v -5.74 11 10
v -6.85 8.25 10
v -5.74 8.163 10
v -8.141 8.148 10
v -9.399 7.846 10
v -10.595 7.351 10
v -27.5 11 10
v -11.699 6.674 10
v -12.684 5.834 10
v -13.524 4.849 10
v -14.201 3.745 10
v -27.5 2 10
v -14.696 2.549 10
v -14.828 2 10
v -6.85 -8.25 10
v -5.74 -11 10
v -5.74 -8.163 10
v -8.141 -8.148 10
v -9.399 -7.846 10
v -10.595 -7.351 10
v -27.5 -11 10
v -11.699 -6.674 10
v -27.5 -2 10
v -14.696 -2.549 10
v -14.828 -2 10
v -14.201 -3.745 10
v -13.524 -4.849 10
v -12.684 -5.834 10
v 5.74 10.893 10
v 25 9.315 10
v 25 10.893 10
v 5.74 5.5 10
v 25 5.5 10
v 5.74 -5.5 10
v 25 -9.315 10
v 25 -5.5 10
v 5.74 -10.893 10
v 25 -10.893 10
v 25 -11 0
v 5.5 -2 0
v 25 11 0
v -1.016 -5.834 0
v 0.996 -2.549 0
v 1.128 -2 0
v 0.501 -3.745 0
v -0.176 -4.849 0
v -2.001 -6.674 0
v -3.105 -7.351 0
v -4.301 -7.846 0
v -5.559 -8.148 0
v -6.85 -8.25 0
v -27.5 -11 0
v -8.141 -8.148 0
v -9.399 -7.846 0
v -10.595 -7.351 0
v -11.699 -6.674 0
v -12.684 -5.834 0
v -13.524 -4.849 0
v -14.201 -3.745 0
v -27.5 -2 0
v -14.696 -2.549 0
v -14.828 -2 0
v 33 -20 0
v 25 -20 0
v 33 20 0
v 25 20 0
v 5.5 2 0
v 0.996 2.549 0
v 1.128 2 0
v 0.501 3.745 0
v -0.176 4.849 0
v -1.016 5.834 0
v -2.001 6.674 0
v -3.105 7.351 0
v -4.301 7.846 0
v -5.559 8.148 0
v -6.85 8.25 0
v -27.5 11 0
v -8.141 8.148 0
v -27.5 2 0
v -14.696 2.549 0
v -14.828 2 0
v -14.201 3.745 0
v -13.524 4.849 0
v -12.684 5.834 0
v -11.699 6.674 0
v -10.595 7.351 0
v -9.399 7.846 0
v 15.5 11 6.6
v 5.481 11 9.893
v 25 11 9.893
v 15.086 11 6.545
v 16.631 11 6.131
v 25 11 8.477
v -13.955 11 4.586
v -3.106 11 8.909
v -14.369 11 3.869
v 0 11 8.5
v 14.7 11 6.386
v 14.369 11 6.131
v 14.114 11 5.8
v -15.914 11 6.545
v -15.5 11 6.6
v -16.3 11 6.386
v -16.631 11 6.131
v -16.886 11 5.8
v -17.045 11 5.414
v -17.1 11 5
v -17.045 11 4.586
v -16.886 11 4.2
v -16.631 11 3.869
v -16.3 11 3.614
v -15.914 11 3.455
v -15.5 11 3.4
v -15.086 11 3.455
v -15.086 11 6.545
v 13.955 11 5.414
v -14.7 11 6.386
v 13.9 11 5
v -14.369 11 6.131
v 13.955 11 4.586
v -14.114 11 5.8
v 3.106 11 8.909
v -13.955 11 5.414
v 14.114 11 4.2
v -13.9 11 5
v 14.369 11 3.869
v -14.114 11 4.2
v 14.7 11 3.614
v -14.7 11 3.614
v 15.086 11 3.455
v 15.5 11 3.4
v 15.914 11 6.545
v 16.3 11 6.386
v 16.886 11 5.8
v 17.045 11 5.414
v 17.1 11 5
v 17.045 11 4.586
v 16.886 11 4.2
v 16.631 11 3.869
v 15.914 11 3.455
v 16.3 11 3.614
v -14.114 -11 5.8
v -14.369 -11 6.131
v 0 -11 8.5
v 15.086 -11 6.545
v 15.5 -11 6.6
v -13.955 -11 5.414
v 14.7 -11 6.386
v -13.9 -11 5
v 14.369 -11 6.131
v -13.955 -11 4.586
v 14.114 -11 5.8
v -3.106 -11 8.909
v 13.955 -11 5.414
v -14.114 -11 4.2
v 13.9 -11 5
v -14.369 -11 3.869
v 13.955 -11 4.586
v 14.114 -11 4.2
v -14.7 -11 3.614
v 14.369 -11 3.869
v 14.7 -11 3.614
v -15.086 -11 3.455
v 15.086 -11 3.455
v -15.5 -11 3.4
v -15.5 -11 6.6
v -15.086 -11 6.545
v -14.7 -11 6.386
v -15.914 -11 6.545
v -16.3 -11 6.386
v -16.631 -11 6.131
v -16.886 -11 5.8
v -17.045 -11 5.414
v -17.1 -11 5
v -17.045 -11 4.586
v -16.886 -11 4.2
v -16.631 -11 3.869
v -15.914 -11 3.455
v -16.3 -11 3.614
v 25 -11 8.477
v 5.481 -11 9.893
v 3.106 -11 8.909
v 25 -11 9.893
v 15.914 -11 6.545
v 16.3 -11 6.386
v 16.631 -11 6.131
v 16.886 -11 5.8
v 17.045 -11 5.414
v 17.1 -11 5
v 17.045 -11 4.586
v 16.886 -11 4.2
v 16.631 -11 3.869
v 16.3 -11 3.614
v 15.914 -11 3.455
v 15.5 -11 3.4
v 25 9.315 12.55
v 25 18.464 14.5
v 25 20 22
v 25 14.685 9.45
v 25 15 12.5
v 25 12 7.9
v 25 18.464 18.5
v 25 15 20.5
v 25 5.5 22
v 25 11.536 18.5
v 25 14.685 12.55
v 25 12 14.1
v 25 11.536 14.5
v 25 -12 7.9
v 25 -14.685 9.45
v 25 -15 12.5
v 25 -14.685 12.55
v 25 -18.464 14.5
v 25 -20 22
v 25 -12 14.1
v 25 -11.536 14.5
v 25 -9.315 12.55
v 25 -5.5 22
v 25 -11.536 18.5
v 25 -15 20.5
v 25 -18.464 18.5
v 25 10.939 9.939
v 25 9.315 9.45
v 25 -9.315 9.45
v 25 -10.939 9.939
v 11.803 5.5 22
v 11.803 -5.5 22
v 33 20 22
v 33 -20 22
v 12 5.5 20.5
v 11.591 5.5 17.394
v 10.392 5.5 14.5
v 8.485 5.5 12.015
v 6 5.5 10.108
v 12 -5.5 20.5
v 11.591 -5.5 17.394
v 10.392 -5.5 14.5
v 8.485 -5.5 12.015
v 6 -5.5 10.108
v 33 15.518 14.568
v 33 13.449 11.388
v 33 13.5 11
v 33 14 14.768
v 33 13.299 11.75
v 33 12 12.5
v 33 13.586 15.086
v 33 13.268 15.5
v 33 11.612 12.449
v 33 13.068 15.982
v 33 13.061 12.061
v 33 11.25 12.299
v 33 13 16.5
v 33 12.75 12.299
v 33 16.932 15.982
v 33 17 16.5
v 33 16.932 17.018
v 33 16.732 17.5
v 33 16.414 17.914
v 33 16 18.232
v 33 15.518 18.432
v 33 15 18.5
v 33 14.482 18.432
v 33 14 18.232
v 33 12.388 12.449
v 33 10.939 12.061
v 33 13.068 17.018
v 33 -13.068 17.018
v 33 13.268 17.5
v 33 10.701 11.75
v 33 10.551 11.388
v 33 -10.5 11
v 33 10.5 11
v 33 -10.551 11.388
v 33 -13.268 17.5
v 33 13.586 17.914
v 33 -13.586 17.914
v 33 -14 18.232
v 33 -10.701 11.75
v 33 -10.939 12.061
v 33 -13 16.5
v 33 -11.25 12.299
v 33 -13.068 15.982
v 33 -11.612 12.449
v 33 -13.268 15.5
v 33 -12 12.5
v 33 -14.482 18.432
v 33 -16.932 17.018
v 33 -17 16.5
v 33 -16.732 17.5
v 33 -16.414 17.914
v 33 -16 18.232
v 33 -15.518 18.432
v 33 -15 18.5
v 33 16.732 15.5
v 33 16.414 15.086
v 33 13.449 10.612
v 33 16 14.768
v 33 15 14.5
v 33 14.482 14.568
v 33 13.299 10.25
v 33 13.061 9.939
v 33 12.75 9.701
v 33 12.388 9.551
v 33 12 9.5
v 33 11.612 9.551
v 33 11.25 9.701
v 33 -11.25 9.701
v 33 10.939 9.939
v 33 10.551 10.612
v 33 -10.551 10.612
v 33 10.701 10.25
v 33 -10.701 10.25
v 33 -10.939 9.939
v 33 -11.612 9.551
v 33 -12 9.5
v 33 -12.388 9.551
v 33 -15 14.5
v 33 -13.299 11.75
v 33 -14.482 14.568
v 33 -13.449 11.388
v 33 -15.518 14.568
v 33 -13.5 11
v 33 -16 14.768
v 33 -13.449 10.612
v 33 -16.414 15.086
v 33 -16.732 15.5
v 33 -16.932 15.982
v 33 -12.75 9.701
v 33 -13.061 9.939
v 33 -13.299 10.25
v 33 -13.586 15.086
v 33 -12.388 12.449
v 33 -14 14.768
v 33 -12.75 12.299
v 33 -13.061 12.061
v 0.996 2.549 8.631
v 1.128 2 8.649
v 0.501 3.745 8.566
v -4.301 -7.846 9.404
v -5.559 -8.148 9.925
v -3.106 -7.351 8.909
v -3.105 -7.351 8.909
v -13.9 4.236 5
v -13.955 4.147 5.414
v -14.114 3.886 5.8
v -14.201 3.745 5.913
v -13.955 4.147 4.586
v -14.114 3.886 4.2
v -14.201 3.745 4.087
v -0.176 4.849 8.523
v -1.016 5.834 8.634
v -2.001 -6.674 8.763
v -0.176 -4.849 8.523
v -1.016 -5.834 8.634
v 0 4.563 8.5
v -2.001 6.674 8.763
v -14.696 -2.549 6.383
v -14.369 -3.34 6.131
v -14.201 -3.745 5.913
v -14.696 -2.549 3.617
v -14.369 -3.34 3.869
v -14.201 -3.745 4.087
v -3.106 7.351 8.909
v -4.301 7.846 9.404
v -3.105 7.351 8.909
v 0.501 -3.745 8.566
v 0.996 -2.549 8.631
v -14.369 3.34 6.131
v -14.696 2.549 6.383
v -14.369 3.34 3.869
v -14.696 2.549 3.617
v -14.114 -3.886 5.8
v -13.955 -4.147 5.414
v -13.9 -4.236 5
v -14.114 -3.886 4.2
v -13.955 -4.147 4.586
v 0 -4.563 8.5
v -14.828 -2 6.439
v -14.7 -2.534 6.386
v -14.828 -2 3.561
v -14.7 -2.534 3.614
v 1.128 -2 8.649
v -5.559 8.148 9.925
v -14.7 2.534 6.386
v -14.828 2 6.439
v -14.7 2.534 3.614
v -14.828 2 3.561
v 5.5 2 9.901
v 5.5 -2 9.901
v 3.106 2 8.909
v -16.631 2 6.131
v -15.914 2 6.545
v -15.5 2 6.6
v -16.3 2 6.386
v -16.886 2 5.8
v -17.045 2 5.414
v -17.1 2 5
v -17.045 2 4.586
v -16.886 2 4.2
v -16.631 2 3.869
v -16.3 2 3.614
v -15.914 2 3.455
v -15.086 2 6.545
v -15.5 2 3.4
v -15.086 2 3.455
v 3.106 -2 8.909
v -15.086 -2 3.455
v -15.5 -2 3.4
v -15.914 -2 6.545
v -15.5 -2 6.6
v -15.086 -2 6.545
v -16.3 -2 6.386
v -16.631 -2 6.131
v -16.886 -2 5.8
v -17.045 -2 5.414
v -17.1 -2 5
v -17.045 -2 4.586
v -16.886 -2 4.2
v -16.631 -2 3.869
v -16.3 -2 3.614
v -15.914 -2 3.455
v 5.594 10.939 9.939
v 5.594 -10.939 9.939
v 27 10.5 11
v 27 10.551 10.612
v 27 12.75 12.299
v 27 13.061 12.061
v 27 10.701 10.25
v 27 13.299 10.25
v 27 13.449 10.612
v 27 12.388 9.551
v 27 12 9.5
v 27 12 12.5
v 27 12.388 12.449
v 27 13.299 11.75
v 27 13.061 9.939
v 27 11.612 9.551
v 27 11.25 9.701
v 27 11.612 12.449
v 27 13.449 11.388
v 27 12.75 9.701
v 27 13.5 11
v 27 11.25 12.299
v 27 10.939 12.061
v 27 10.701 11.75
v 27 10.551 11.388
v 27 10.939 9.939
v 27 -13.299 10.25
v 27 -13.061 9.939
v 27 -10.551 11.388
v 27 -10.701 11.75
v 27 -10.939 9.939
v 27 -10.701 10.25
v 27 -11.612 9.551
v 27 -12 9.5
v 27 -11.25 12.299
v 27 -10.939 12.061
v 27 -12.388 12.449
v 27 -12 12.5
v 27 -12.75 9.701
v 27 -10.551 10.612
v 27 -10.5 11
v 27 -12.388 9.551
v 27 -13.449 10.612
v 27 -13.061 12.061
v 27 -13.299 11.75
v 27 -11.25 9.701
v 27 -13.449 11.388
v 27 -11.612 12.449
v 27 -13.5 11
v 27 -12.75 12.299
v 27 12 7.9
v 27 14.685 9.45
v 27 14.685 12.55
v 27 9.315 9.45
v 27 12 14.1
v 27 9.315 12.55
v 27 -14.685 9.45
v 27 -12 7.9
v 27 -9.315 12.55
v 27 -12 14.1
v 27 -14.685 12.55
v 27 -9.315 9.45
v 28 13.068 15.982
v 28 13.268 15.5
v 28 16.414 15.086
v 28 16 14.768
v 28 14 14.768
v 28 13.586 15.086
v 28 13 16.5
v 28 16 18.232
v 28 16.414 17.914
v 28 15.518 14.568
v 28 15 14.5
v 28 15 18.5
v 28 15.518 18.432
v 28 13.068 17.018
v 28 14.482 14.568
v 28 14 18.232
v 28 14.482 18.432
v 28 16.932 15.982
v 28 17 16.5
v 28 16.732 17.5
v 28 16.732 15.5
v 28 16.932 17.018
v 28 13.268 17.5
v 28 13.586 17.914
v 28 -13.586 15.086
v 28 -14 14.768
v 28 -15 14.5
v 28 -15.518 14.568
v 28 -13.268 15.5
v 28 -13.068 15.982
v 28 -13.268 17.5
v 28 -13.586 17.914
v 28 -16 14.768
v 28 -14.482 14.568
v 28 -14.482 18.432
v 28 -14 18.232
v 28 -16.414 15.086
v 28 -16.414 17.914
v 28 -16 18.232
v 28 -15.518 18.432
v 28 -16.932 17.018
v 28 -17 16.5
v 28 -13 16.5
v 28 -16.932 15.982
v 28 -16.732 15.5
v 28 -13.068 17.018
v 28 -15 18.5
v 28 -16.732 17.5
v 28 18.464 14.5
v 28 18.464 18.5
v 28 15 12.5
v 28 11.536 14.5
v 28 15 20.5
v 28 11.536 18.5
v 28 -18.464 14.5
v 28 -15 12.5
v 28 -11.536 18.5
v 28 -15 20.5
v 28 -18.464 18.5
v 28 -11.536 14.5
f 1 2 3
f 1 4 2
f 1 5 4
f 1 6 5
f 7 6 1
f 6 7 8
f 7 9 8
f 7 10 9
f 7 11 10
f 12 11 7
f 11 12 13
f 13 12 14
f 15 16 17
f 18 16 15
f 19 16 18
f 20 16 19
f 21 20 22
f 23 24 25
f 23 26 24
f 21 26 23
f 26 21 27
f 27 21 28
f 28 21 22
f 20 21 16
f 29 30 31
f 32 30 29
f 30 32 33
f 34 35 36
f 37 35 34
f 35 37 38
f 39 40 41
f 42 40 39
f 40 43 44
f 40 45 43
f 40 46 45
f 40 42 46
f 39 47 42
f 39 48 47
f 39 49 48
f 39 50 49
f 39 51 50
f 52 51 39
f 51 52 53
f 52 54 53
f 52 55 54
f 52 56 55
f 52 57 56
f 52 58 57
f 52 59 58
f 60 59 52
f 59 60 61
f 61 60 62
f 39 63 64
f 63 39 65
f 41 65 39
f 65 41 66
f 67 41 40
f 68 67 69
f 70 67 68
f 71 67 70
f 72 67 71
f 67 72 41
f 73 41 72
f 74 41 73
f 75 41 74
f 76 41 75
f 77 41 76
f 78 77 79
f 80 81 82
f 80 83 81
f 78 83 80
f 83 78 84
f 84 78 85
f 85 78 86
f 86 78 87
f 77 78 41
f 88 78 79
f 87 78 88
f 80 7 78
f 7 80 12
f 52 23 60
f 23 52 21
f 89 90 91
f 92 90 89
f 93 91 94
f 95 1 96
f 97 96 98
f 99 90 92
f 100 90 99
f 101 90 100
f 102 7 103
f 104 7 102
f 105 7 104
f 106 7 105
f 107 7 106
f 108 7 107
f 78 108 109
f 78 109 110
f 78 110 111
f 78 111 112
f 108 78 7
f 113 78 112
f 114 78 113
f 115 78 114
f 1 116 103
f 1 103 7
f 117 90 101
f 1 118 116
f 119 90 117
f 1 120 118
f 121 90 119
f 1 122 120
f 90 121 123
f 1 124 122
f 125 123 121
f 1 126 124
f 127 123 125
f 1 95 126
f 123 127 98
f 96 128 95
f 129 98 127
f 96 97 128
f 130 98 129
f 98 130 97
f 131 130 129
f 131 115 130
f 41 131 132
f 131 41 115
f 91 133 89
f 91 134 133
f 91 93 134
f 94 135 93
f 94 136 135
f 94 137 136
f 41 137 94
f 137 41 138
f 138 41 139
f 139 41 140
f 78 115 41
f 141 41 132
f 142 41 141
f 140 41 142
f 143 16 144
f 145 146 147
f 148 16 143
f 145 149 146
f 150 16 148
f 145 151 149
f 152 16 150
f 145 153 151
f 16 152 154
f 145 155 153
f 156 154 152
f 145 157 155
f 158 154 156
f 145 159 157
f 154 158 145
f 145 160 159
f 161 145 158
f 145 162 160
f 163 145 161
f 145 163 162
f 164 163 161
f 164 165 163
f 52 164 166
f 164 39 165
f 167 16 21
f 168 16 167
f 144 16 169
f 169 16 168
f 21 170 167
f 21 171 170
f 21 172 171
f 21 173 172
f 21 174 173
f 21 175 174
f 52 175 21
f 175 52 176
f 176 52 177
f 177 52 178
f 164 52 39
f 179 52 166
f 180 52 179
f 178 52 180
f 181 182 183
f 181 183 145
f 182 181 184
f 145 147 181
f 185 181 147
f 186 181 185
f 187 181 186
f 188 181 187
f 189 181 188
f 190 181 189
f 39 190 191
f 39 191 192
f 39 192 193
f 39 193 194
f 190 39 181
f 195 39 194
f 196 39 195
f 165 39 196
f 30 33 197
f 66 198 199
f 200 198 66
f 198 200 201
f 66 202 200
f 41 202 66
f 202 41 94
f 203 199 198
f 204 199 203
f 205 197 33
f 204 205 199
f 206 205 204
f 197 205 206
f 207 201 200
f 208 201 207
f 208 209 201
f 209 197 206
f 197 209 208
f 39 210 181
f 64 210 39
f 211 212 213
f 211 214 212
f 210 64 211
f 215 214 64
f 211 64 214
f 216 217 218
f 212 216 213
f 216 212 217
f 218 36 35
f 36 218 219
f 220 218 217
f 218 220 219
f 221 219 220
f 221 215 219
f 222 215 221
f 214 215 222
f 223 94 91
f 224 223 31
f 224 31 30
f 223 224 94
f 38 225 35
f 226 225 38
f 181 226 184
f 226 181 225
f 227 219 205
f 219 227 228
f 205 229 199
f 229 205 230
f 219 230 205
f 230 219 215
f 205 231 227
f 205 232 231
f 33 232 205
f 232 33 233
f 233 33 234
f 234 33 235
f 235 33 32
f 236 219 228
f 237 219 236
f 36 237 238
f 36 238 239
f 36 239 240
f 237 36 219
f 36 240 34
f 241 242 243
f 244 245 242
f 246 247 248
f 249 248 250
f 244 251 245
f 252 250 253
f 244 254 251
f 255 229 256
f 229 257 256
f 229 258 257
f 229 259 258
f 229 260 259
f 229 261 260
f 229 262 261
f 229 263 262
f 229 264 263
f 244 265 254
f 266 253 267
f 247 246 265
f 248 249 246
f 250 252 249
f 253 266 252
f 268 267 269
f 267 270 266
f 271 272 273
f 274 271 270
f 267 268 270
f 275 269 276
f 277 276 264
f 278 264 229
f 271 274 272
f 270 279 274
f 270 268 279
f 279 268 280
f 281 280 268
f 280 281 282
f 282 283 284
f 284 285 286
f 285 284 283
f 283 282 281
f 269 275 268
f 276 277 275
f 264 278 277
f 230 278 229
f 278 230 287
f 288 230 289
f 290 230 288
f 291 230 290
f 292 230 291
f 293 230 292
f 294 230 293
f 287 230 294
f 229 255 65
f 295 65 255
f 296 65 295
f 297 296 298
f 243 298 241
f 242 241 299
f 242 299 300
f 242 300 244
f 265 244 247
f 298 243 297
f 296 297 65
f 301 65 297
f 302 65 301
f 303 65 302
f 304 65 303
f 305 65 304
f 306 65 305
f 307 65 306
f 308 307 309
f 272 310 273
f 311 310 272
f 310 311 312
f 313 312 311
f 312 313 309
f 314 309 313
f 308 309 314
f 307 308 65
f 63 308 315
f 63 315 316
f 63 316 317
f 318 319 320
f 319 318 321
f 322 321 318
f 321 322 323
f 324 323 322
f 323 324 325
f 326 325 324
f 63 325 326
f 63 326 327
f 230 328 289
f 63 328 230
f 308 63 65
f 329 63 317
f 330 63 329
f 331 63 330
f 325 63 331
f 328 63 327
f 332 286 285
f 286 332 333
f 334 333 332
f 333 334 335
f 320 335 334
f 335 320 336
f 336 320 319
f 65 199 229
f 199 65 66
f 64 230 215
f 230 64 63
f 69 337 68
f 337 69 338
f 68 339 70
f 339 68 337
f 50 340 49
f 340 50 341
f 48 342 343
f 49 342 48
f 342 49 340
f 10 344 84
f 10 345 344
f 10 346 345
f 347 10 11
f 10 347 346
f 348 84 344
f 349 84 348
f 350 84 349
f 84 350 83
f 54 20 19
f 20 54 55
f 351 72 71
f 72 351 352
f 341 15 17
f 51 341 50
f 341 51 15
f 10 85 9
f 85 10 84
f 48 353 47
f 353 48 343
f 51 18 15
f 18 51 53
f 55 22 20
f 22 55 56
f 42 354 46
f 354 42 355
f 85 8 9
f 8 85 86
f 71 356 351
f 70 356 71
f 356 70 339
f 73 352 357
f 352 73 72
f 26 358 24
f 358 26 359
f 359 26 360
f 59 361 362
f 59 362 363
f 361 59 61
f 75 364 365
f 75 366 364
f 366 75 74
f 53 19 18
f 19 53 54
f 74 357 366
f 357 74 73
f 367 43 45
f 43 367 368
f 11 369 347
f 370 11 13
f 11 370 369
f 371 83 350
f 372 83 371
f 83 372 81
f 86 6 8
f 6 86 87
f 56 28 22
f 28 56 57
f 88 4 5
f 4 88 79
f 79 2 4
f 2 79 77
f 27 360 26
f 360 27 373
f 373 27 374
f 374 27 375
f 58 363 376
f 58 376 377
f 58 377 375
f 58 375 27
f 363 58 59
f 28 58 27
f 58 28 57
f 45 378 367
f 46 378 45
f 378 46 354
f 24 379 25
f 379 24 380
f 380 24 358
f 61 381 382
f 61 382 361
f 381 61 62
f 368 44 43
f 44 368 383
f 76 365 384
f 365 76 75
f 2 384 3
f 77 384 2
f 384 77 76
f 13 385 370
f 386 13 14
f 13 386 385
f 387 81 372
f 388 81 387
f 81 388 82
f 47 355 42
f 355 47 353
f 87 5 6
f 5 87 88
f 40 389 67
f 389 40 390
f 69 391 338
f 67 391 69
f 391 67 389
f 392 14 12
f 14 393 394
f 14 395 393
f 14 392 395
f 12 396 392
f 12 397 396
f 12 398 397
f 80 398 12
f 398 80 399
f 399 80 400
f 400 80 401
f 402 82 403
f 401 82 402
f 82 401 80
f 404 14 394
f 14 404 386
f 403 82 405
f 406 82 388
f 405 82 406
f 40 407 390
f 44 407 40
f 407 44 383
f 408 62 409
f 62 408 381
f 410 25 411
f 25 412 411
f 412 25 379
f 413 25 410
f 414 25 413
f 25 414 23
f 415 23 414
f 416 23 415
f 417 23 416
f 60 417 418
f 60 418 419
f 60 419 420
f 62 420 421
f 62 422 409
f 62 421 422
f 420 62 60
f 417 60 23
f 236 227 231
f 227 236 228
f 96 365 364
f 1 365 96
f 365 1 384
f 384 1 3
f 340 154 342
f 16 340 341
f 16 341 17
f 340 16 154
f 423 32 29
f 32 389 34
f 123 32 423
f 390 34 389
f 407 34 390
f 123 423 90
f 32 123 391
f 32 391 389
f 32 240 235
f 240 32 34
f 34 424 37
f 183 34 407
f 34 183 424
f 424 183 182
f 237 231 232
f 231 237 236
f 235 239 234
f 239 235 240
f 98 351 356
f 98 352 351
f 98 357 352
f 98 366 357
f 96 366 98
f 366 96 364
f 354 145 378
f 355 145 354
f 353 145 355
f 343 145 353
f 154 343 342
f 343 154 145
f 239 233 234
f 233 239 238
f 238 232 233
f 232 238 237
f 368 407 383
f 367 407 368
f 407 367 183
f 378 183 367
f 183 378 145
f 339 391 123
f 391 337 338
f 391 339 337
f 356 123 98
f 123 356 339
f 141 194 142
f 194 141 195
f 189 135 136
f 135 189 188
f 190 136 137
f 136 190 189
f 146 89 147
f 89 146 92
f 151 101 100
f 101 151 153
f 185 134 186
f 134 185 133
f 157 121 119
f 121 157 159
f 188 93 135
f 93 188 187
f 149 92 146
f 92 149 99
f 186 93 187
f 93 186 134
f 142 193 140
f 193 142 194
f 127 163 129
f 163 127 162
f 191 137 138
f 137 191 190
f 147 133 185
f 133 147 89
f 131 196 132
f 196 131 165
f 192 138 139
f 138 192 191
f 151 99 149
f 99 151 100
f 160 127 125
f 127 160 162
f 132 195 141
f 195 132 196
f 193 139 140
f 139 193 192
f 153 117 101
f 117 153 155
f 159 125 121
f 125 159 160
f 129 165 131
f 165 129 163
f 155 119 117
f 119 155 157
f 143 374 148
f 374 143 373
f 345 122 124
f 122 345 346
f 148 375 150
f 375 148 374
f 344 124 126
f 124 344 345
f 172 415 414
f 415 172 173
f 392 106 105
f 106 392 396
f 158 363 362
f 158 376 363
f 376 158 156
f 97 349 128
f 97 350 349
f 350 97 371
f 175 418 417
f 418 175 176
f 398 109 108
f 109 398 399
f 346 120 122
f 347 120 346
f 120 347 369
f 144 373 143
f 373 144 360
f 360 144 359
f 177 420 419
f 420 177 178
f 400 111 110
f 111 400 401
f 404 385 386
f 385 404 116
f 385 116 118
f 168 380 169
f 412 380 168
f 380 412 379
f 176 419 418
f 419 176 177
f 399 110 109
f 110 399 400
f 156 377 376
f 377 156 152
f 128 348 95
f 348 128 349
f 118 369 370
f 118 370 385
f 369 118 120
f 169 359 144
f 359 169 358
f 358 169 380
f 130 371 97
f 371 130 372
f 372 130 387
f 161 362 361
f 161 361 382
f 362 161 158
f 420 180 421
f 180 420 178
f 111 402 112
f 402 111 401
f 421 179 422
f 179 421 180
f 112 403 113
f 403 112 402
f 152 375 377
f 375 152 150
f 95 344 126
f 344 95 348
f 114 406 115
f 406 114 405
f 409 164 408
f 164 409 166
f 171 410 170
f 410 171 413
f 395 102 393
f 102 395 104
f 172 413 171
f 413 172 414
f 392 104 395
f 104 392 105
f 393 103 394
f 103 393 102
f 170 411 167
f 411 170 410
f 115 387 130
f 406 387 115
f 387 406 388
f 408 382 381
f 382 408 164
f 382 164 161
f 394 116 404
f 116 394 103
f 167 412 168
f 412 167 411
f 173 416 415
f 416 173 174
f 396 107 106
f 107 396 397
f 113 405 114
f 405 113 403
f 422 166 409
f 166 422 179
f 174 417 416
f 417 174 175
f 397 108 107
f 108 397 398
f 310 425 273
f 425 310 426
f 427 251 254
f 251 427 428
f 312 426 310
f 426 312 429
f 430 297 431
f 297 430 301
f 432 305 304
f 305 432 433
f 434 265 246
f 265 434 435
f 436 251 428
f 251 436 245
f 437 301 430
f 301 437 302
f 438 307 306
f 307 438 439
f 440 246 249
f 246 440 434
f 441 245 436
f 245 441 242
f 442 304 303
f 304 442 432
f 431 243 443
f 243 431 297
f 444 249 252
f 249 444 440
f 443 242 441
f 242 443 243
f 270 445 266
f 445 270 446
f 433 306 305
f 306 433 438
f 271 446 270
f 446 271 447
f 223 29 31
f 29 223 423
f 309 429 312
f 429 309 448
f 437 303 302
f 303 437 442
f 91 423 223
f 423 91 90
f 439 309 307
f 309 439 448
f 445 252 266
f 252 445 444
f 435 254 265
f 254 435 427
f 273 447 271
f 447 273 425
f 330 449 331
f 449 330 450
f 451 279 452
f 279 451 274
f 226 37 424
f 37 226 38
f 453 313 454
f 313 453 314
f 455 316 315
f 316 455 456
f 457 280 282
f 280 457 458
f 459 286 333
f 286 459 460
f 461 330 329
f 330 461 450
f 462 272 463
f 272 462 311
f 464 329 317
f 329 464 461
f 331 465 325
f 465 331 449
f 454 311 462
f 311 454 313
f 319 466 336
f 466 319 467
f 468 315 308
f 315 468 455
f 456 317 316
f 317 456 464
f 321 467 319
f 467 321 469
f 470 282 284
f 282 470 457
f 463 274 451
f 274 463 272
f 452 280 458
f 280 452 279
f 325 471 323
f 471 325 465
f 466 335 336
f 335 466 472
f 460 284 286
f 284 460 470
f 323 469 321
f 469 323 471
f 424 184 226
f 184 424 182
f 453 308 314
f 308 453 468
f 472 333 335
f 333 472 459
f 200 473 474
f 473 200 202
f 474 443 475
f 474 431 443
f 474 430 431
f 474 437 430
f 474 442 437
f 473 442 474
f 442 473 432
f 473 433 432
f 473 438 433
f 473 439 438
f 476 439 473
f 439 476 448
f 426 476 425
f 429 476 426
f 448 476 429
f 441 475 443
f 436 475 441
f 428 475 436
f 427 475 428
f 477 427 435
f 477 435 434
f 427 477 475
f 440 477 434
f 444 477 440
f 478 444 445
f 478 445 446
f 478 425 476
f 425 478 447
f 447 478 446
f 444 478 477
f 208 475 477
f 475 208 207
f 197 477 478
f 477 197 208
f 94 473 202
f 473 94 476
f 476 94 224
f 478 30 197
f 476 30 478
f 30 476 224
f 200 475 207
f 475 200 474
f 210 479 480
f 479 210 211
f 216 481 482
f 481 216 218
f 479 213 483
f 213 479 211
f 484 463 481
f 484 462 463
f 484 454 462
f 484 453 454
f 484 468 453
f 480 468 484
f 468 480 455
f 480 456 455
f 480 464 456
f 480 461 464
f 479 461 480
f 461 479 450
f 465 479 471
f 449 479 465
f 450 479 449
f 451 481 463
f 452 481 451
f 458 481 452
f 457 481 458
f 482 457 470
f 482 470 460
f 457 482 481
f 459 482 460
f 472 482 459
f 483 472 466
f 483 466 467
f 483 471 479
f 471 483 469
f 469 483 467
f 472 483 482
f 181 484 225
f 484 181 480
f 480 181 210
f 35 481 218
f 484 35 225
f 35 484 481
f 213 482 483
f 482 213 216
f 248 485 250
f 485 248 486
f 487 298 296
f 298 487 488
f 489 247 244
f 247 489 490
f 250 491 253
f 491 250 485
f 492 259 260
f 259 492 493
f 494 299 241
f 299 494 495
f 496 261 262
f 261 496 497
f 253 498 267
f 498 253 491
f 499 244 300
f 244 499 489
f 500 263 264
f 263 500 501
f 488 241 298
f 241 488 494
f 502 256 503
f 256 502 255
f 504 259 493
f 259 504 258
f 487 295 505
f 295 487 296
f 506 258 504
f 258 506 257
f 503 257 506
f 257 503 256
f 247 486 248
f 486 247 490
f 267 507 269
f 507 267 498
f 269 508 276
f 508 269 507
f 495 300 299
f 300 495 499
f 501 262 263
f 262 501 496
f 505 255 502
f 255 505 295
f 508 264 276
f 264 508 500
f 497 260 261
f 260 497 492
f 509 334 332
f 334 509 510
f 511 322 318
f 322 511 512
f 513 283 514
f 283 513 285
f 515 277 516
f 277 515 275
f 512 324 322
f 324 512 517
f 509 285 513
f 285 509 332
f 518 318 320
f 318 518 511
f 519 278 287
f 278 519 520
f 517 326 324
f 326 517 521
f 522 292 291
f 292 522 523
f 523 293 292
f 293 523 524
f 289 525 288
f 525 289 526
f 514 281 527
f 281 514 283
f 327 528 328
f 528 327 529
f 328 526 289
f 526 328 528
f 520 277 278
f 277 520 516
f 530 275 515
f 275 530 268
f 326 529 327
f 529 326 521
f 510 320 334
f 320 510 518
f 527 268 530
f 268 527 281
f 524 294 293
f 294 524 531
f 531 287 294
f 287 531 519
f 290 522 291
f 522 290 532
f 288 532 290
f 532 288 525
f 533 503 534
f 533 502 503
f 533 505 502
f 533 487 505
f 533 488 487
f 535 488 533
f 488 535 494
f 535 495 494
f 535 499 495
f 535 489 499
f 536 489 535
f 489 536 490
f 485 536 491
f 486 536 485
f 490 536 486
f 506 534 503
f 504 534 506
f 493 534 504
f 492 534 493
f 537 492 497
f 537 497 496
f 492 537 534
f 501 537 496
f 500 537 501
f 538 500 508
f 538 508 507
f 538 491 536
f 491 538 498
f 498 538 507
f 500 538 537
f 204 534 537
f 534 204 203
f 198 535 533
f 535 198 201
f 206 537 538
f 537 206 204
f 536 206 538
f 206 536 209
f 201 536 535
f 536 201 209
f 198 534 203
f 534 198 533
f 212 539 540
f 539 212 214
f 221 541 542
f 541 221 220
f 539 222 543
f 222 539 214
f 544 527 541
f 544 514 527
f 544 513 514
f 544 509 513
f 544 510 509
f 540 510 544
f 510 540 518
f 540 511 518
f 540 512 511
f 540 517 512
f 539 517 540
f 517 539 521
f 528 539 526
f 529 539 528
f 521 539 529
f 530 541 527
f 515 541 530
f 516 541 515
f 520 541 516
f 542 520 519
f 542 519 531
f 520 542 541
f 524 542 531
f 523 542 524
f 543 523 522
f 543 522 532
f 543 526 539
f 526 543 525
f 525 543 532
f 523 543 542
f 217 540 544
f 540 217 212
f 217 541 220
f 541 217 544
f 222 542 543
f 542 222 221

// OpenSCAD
nema_screw_d = 31;
center_offset =  6.85;
base_x = 60;
base_y = 22;
base_z = 10;

j_r_small = 12/2;
j_r_large = 16.5/2;
j_h_small = 4;
j_h_large = 5;

//filament
color("red") %translate([-center_offset,0,-30]) cylinder(r=3/2, h= 60, $fn=10);

//m3 screv nema mount
% translate([nema_screw_d/2,30,base_z/2]) rotate([90,0,0]) cylinder(r=3/2, h= 60, $fn=24);
% translate([-nema_screw_d/2,30,base_z/2]) rotate([90,0,0]) cylinder(r=3/2, h= 60, $fn=24);

% translate([0,30,base_z/2+nema_screw_d/2]) rotate([90,0,0]) cylinder(r=24/2, h= 60, $fn=24);

difference() {
    union() {
        translate([-nema_screw_d/2-12,-base_y/2,0])  cube([base_x,base_y, base_z]);
        translate([0,-base_y/4,0]) cube([25,base_y/2,back_z]);
        //backplate
        back_x = 8;
        back_y = 40;
        back_z = 22;
        translate([25,-back_y/2,0]) cube([8,back_y,22]);
    }
    //jhead cut
    //translate([-center_offset,0,-0.1]) cylinder(r=j_r_small, h=j_h_small, $fn=40);
    translate([-center_offset,0,-0.2]) cylinder(r=j_r_large, h=j_h_large*3, $fn=40);
    
    // clamp cut
    clamp_y = 4;
    translate([-base_x+10-4.5,-clamp_y/2,0]) cube([base_x,clamp_y,base_z]);
    
    //nema cut
    color("cyan") translate([0,30,base_z/2+nema_screw_d/2]) rotate([90,0,0]) cylinder(r=24/2, h= 60, $fn=24);
    //m3 screv nema mount
    color("cyan") translate([nema_screw_d/2,30,base_z/2]) rotate([90,0,0]) cylinder(r=3.2/2, h= 60, $fn=24);
    color("cyan") translate([-nema_screw_d/2,30,base_z/2]) rotate([90,0,0]) cylinder(r=3.2/2, h= 60, $fn=24);
    
    // mount screws
    dist1=24;
    dist2=30;
    //dist1
    color("blue") translate([0,dist1/2,22*2/4]) rotate([0,90,0]) cylinder(r=3/2, h= 60, $fn=24);
    color("blue") translate([0,-dist1/2,22*2/4]) rotate([0,90,0]) cylinder(r=3/2, h= 60, $fn=24);
    //nuts
    color("cyan") translate([25,dist1/2,22*2/4]) rotate([0,90,0]) cylinder(r=6.2/2, h=2, $fn=6);
    color("cyan") translate([25,-dist1/2,22*2/4]) rotate([0,90,0]) cylinder(r=6.2/2, h=2, $fn=6);
    //dist2
    color("blue") translate([0,dist2/2,22*3/4]) rotate([0,90,0]) cylinder(r=4/2, h= 60, $fn=24);
    color("blue") translate([0,-dist2/2,22*3/4]) rotate([0,90,0]) cylinder(r=4/2, h= 60, $fn=24);
    //nuts
    color("cyan") translate([25,dist2/2,22*3/4]) rotate([0,90,0]) cylinder(r=8/2, h=3, $fn=6);
    color("cyan") translate([25,-dist2/2,22*3/4]) rotate([0,90,0]) cylinder(r=8/2, h=3, $fn=6);
}


//translate([0,-base_y/4,0]) cube([25,base_y/2,back_z]);
